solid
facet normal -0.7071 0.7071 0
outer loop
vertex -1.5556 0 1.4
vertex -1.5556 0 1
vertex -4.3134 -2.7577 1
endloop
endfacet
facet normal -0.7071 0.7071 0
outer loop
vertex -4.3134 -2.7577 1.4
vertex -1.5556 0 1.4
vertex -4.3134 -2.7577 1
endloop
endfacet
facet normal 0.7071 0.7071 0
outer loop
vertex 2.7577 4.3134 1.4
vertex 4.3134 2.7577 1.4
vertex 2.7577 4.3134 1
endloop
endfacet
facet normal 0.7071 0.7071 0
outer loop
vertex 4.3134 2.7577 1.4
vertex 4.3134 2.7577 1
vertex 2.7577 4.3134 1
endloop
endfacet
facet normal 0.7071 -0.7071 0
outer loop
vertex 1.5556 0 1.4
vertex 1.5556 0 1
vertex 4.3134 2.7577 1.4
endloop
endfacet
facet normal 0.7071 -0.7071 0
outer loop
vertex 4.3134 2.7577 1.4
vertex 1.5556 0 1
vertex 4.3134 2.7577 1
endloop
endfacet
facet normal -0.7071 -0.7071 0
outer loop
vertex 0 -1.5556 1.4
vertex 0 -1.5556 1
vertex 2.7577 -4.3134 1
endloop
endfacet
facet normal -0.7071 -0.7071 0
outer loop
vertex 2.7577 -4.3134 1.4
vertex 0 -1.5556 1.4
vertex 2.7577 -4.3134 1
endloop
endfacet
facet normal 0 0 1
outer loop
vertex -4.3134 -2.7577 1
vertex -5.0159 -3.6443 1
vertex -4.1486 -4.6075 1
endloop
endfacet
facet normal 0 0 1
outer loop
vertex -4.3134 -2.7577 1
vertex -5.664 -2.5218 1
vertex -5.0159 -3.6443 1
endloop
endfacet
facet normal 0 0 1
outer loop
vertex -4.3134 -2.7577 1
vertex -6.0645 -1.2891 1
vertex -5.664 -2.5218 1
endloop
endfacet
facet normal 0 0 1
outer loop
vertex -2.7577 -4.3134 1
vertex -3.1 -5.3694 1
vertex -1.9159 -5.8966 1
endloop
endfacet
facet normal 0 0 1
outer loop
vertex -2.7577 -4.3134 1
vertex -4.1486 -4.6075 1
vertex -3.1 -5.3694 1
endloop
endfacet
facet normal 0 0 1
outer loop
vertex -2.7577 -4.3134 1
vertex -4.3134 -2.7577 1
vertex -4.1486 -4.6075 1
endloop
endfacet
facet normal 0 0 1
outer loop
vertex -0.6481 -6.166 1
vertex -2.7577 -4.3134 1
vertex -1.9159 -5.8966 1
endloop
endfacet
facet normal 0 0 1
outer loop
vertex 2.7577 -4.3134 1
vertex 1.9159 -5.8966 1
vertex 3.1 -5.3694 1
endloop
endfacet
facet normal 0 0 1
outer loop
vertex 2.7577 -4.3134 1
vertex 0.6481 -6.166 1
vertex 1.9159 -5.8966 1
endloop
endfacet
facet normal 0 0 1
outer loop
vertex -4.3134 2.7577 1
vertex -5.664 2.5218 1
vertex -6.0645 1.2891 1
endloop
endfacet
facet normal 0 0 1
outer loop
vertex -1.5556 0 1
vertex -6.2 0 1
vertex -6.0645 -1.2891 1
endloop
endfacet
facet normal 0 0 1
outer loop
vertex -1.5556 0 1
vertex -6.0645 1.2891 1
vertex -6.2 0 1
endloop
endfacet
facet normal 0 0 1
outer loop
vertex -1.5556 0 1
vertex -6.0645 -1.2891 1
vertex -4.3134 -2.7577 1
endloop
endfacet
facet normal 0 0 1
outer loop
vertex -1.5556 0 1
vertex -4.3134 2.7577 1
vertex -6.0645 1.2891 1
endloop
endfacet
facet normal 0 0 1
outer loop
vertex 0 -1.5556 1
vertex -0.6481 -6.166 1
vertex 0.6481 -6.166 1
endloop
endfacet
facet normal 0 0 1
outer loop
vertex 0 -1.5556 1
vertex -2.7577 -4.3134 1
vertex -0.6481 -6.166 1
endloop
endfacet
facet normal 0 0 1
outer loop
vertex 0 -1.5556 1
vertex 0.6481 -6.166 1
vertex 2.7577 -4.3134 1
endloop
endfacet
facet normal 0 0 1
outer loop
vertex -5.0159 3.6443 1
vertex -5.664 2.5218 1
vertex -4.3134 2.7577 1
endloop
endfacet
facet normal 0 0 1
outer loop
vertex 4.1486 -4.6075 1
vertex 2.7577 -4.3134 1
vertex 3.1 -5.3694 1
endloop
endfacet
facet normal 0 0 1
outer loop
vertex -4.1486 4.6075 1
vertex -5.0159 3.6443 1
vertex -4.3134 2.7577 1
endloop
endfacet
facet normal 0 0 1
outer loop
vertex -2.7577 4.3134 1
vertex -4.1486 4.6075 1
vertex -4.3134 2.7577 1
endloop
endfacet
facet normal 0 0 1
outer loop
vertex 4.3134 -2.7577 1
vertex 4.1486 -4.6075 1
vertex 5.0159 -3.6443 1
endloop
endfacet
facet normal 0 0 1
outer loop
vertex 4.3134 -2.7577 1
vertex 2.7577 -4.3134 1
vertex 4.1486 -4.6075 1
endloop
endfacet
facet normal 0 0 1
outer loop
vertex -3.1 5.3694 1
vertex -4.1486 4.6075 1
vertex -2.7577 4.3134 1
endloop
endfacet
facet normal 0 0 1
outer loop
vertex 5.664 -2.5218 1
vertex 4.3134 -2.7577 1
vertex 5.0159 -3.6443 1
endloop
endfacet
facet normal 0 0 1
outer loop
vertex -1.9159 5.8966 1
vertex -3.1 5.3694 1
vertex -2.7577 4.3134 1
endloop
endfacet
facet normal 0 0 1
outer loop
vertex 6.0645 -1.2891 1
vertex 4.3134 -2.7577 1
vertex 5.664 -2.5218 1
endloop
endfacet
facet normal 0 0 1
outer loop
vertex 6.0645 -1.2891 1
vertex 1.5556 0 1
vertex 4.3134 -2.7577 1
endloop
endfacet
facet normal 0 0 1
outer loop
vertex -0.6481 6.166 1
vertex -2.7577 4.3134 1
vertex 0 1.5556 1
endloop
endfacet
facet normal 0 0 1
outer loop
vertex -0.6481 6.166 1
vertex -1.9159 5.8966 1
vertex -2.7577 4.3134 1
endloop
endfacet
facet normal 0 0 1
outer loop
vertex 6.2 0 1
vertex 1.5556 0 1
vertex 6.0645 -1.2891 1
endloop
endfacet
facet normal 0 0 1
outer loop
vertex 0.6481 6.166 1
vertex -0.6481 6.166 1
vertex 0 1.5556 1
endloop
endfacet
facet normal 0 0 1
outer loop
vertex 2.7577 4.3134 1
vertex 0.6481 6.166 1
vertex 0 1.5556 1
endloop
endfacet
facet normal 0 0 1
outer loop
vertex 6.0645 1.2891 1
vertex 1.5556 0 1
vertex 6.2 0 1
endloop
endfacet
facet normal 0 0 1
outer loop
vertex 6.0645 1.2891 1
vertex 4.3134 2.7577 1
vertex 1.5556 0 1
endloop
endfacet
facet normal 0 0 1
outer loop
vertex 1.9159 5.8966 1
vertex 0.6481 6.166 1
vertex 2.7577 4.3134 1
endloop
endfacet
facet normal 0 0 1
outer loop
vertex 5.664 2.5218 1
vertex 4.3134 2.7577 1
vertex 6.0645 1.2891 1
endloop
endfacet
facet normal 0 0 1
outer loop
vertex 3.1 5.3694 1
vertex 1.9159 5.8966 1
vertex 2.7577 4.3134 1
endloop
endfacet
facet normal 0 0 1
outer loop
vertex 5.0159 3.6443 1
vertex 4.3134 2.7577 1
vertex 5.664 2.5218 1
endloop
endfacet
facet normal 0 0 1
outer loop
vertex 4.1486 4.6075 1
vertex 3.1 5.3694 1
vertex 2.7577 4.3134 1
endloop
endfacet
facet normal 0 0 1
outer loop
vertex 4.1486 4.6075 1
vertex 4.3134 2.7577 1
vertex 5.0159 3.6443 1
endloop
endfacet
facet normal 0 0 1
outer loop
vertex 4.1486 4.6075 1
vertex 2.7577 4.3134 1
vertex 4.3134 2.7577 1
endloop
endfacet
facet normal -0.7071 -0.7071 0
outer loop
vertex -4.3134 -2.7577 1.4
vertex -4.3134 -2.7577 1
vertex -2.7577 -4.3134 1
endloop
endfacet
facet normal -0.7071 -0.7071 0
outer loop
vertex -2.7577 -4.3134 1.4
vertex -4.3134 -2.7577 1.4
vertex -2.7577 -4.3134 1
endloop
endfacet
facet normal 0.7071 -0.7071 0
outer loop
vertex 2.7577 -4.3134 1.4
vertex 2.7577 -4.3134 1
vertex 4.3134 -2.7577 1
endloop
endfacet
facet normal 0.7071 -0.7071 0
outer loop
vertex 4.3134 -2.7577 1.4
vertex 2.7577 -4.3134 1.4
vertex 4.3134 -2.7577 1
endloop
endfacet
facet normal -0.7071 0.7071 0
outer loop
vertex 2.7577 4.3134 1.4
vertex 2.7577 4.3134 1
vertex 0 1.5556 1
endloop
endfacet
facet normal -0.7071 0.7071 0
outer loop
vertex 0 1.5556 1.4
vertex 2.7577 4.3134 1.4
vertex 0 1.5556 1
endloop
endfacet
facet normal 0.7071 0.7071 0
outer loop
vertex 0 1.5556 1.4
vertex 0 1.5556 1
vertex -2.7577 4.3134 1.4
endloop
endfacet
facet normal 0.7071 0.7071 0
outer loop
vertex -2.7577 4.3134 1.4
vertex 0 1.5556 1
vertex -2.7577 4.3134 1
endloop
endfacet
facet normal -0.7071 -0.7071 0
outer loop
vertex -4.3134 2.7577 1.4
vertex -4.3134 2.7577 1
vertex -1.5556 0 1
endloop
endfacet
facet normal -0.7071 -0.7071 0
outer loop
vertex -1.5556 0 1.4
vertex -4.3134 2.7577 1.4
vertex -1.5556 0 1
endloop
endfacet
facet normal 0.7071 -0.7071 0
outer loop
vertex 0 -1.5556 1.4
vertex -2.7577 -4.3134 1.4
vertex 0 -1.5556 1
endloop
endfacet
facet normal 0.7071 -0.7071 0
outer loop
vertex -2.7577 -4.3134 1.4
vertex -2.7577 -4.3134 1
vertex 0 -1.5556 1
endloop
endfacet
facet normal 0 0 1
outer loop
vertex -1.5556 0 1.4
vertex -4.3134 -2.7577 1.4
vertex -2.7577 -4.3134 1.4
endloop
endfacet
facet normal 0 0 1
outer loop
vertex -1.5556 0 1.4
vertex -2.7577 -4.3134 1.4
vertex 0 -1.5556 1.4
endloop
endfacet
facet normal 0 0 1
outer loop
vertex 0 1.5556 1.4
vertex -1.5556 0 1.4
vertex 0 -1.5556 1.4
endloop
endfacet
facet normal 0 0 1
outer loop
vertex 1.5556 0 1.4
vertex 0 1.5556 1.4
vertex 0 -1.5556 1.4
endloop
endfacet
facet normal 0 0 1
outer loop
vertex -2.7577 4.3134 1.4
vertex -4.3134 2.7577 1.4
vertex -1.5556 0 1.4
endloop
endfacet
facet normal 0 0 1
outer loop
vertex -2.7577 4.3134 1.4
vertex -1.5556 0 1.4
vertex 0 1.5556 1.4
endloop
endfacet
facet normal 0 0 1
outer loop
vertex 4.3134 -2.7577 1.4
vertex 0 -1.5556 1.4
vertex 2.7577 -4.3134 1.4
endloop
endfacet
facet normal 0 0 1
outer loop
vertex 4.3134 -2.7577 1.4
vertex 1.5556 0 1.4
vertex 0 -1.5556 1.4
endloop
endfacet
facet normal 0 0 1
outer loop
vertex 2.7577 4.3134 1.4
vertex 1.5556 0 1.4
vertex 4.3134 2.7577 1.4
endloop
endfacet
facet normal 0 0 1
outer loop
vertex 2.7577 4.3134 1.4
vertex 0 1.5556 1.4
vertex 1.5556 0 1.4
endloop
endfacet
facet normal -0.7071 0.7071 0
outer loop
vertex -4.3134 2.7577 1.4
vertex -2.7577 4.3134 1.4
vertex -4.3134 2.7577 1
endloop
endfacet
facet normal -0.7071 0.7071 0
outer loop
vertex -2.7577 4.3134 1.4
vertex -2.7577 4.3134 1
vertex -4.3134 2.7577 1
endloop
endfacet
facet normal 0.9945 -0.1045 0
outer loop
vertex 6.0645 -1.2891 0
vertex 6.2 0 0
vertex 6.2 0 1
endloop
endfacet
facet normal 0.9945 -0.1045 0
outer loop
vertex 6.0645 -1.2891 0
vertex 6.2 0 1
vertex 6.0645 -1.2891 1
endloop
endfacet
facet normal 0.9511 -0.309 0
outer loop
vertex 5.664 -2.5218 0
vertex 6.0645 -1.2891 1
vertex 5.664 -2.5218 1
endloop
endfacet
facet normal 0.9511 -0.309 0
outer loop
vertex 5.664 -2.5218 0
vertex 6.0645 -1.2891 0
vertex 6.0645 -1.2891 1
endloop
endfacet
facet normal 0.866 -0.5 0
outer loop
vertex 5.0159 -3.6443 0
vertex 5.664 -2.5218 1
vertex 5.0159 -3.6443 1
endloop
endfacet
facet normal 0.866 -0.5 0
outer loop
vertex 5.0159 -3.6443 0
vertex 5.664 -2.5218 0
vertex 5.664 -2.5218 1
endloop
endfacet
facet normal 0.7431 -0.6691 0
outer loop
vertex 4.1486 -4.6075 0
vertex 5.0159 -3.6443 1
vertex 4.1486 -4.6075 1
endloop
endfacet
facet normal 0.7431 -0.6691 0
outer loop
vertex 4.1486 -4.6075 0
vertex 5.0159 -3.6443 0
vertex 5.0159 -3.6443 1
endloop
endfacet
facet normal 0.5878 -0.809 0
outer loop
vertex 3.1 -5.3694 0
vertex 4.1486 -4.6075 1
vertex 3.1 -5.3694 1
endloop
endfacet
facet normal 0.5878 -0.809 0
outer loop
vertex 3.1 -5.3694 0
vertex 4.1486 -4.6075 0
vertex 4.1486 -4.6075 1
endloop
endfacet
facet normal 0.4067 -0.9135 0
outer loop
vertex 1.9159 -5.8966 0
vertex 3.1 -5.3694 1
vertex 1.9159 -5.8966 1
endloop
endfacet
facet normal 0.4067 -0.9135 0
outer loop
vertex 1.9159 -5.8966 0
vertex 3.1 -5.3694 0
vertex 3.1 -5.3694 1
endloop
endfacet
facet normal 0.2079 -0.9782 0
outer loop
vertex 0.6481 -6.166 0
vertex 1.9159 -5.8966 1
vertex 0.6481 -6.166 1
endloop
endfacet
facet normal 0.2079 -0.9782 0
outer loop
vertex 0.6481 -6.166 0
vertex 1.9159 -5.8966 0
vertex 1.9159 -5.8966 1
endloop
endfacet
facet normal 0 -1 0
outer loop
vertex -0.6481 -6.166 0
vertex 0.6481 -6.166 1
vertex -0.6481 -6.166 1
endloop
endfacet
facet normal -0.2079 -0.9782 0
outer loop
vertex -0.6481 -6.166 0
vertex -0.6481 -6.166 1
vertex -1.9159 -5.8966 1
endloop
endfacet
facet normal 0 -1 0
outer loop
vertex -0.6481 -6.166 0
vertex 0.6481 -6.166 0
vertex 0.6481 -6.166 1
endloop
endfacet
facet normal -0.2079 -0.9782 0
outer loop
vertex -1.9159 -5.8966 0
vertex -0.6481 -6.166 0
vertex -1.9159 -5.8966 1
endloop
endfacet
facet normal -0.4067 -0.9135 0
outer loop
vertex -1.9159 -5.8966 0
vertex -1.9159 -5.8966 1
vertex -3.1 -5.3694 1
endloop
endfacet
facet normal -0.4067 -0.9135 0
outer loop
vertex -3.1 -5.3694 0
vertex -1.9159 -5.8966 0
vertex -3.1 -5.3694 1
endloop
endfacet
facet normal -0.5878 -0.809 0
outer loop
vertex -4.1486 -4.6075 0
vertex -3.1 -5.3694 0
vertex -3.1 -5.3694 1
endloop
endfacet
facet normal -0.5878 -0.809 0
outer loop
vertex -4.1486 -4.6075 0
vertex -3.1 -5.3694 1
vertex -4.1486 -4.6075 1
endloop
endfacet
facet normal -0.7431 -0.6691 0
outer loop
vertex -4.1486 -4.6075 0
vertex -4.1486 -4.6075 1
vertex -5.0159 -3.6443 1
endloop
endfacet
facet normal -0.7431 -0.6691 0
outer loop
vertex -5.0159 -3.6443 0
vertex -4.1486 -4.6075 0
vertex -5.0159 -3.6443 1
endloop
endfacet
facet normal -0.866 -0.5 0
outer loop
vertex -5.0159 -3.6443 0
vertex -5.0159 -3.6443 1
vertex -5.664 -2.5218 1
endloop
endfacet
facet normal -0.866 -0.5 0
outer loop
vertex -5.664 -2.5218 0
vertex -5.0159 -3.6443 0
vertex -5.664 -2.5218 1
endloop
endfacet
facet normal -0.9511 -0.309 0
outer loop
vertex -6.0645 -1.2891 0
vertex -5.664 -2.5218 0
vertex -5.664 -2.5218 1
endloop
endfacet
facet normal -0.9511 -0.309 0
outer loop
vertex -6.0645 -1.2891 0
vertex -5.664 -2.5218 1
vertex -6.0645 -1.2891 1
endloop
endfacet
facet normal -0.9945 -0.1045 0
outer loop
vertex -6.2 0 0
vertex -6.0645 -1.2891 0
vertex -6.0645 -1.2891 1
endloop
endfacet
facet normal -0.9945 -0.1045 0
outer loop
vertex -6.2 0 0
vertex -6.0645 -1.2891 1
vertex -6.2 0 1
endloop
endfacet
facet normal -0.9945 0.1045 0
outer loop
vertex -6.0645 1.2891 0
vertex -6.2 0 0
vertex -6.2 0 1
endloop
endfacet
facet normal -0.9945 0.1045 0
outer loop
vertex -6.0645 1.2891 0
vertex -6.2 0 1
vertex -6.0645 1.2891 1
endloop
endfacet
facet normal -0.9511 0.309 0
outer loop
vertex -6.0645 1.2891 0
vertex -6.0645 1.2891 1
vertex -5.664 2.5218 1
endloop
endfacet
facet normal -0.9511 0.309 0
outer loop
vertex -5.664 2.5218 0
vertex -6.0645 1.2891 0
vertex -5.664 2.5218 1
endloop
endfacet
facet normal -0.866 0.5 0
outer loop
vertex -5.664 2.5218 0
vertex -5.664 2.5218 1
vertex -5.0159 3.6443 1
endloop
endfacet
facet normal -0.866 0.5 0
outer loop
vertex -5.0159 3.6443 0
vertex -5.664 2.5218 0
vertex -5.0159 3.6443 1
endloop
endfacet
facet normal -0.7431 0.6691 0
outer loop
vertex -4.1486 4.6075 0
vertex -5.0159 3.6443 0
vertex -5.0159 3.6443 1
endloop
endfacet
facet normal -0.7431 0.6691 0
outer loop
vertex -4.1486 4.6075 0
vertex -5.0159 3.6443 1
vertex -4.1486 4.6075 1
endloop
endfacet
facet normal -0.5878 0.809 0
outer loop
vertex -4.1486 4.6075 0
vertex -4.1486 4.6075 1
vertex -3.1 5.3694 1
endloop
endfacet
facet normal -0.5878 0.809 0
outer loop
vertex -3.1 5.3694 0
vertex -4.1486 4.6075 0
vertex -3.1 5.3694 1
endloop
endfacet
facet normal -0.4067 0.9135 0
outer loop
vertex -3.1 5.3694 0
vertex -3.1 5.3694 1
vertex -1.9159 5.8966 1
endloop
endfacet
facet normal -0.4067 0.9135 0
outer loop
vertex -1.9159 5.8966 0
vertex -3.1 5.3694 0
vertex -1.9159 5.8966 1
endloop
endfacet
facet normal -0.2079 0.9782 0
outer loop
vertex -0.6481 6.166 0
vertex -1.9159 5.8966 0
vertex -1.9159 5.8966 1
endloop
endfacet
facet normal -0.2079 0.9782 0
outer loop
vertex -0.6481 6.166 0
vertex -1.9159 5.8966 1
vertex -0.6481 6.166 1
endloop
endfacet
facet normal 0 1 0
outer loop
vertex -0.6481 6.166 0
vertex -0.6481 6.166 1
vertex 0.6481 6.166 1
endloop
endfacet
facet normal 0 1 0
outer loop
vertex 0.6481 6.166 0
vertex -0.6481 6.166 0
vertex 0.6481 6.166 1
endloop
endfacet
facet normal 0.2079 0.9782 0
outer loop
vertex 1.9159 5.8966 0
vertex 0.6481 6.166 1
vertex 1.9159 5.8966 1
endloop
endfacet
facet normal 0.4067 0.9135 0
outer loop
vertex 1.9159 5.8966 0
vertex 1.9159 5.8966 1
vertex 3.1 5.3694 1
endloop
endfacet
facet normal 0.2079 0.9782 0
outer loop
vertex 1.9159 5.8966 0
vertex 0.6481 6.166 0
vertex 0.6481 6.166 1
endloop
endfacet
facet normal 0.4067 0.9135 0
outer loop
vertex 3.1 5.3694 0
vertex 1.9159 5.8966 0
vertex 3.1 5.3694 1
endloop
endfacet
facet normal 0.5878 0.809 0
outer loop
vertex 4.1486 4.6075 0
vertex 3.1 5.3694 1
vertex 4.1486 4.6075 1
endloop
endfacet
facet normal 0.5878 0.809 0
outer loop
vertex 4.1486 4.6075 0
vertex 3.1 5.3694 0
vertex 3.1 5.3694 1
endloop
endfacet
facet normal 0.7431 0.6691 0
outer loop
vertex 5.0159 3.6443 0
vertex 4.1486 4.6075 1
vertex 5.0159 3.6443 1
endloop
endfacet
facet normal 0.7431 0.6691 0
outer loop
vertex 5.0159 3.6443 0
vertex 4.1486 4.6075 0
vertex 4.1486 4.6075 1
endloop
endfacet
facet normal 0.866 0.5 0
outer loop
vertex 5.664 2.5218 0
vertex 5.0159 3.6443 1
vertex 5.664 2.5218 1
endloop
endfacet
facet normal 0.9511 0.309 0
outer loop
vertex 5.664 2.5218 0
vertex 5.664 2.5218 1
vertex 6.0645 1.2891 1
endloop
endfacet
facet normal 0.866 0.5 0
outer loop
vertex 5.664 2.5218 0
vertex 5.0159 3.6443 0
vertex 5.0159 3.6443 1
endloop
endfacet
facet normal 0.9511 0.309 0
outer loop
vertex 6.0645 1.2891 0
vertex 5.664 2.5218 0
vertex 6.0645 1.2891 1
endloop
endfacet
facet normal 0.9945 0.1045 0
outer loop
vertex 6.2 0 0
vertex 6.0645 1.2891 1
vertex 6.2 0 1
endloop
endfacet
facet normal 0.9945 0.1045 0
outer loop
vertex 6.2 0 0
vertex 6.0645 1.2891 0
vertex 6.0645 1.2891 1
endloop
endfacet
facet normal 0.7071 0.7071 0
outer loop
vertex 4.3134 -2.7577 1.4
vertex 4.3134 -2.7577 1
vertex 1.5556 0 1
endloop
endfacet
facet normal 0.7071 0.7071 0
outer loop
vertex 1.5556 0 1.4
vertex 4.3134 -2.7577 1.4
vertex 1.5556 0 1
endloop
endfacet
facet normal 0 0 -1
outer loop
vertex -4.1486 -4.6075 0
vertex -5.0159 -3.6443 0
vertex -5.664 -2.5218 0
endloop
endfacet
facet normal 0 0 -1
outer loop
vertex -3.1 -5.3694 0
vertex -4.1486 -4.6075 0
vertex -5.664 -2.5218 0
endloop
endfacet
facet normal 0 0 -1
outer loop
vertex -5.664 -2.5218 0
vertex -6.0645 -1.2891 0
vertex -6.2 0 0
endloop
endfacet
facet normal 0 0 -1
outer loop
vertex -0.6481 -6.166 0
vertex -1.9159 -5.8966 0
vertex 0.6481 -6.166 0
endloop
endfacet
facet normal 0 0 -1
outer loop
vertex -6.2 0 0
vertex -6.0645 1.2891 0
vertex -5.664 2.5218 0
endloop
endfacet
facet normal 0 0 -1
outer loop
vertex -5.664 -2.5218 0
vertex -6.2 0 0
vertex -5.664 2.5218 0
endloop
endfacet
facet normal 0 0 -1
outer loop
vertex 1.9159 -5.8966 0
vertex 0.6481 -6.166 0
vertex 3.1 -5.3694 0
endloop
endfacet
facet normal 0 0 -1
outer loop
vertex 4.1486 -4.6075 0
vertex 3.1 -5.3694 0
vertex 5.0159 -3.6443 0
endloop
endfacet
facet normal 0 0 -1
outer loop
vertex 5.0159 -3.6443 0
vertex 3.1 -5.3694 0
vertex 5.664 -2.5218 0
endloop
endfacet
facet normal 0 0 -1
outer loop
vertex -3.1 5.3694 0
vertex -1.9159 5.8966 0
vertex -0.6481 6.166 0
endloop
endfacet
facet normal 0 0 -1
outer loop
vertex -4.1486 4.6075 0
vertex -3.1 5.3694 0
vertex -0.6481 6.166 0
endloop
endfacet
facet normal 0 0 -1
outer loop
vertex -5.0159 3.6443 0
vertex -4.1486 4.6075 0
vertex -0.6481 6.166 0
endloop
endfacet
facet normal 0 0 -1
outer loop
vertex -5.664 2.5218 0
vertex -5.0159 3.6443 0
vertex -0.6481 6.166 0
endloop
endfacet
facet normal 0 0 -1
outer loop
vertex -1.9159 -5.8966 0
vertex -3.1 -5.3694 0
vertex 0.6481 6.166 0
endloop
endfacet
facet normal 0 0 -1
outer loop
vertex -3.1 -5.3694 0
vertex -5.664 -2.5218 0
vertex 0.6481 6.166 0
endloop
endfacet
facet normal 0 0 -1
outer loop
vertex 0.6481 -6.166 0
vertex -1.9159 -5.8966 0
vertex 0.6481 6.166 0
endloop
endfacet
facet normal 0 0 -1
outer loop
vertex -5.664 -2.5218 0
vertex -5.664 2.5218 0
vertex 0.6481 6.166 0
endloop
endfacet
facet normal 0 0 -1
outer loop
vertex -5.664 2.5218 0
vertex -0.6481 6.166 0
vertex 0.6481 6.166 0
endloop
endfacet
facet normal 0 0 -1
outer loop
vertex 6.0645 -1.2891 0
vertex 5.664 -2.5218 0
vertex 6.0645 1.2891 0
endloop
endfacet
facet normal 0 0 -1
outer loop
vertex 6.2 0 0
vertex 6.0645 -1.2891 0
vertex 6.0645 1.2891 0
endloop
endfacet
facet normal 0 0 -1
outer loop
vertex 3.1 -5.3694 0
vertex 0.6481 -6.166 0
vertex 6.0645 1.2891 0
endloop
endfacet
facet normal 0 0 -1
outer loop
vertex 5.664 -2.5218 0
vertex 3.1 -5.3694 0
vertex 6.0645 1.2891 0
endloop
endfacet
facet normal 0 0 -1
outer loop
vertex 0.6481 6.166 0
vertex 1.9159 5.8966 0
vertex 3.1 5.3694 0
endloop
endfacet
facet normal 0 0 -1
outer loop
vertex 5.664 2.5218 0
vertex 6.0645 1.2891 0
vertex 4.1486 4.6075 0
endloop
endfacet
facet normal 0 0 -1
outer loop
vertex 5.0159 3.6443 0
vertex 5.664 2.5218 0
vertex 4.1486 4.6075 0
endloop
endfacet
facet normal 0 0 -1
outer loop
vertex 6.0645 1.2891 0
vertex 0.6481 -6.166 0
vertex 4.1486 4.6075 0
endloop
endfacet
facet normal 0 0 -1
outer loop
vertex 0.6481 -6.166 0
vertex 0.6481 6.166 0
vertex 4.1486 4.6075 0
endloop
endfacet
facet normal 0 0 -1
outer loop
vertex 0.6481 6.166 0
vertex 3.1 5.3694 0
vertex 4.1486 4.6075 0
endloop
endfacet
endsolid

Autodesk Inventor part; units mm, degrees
ref_plane "YZ Plane" through (0, 0, 0) normal (1, 0, 0) x (0, 1, 0)
ref_plane "XZ Plane" through (0, 0, 0) normal (0, 1, 0) x (-1, 0, 0)
ref_plane "XY Plane" through (0, 0, 0) normal (0, 0, 1) x (1, 0, 0)
sketch "Náčrt1" plane through (0, 0, 0) normal (0, 0, 1) x (1, 0, 0)
  line L0 (0, 8.68) -> (0, -8.68) projected
  line L1 (-8.68, 0) -> (8.68, 0) projected
  circle A0 centre (0, 0) radius 6.2
  dimension "d0" = 12.4
extrude "Vysunutí1" add sketch "Náčrt1" along normal blind 1
sketch "Náčrt2" plane through (0, 0, 1) normal (0, 0, 1) x (1, 0, 0)
  line L0 (-8.68, 0) -> (8.68, 0) projected
  line L1 (0, 8.68) -> (0, -8.68) projected
  line L2 (0, 1.5556) -> (-2.7577, 4.3134)
  line L3 (-2.7577, 4.3134) -> (-4.3134, 2.7577)
  line L4 (-4.3134, 2.7577) -> (-1.5556, 0)
  line L5 (0, 0) -> (-4.3841, 4.3841)
  circle A0 centre (0, 0) radius 6.2 projected
  line L6 (0, 0) -> (6.2, 0) construction
  line L7 (-4.3134, -2.7577) -> (-2.7577, -4.3134)
  line L8 (-1.5556, 0) -> (-4.3134, -2.7577)
  line L9 (-2.7577, -4.3134) -> (0, -1.5556)
  line L10 (2.7577, -4.3134) -> (4.3134, -2.7577)
  line L11 (0, -1.5556) -> (2.7577, -4.3134)
  line L12 (4.3134, -2.7577) -> (1.5556, 0)
  line L13 (4.3134, 2.7577) -> (2.7577, 4.3134)
  line L14 (1.5556, 0) -> (4.3134, 2.7577)
  line L15 (2.7577, 4.3134) -> (0, 1.5556)
  point P0 (-1.5556, 0)
  point P1 (0, -1.5556)
  point P2 (1.5556, 0)
  dimension "d3" = 2.2
  dimension "d4" = 5
  dimension "d5" = 135
  dimension "d8" = 360
extrude "Vysunutí2" add sketch "Náčrt2" along normal blind 0.4 contours L4 L3 L5 L0 | L0 L1 L9 L7 L8 | L1 L15 L13 L14 L0 | L5 L3 L2 L1 | L0 L12 L10 L11 L1
properties part number "button_plate_cross"
